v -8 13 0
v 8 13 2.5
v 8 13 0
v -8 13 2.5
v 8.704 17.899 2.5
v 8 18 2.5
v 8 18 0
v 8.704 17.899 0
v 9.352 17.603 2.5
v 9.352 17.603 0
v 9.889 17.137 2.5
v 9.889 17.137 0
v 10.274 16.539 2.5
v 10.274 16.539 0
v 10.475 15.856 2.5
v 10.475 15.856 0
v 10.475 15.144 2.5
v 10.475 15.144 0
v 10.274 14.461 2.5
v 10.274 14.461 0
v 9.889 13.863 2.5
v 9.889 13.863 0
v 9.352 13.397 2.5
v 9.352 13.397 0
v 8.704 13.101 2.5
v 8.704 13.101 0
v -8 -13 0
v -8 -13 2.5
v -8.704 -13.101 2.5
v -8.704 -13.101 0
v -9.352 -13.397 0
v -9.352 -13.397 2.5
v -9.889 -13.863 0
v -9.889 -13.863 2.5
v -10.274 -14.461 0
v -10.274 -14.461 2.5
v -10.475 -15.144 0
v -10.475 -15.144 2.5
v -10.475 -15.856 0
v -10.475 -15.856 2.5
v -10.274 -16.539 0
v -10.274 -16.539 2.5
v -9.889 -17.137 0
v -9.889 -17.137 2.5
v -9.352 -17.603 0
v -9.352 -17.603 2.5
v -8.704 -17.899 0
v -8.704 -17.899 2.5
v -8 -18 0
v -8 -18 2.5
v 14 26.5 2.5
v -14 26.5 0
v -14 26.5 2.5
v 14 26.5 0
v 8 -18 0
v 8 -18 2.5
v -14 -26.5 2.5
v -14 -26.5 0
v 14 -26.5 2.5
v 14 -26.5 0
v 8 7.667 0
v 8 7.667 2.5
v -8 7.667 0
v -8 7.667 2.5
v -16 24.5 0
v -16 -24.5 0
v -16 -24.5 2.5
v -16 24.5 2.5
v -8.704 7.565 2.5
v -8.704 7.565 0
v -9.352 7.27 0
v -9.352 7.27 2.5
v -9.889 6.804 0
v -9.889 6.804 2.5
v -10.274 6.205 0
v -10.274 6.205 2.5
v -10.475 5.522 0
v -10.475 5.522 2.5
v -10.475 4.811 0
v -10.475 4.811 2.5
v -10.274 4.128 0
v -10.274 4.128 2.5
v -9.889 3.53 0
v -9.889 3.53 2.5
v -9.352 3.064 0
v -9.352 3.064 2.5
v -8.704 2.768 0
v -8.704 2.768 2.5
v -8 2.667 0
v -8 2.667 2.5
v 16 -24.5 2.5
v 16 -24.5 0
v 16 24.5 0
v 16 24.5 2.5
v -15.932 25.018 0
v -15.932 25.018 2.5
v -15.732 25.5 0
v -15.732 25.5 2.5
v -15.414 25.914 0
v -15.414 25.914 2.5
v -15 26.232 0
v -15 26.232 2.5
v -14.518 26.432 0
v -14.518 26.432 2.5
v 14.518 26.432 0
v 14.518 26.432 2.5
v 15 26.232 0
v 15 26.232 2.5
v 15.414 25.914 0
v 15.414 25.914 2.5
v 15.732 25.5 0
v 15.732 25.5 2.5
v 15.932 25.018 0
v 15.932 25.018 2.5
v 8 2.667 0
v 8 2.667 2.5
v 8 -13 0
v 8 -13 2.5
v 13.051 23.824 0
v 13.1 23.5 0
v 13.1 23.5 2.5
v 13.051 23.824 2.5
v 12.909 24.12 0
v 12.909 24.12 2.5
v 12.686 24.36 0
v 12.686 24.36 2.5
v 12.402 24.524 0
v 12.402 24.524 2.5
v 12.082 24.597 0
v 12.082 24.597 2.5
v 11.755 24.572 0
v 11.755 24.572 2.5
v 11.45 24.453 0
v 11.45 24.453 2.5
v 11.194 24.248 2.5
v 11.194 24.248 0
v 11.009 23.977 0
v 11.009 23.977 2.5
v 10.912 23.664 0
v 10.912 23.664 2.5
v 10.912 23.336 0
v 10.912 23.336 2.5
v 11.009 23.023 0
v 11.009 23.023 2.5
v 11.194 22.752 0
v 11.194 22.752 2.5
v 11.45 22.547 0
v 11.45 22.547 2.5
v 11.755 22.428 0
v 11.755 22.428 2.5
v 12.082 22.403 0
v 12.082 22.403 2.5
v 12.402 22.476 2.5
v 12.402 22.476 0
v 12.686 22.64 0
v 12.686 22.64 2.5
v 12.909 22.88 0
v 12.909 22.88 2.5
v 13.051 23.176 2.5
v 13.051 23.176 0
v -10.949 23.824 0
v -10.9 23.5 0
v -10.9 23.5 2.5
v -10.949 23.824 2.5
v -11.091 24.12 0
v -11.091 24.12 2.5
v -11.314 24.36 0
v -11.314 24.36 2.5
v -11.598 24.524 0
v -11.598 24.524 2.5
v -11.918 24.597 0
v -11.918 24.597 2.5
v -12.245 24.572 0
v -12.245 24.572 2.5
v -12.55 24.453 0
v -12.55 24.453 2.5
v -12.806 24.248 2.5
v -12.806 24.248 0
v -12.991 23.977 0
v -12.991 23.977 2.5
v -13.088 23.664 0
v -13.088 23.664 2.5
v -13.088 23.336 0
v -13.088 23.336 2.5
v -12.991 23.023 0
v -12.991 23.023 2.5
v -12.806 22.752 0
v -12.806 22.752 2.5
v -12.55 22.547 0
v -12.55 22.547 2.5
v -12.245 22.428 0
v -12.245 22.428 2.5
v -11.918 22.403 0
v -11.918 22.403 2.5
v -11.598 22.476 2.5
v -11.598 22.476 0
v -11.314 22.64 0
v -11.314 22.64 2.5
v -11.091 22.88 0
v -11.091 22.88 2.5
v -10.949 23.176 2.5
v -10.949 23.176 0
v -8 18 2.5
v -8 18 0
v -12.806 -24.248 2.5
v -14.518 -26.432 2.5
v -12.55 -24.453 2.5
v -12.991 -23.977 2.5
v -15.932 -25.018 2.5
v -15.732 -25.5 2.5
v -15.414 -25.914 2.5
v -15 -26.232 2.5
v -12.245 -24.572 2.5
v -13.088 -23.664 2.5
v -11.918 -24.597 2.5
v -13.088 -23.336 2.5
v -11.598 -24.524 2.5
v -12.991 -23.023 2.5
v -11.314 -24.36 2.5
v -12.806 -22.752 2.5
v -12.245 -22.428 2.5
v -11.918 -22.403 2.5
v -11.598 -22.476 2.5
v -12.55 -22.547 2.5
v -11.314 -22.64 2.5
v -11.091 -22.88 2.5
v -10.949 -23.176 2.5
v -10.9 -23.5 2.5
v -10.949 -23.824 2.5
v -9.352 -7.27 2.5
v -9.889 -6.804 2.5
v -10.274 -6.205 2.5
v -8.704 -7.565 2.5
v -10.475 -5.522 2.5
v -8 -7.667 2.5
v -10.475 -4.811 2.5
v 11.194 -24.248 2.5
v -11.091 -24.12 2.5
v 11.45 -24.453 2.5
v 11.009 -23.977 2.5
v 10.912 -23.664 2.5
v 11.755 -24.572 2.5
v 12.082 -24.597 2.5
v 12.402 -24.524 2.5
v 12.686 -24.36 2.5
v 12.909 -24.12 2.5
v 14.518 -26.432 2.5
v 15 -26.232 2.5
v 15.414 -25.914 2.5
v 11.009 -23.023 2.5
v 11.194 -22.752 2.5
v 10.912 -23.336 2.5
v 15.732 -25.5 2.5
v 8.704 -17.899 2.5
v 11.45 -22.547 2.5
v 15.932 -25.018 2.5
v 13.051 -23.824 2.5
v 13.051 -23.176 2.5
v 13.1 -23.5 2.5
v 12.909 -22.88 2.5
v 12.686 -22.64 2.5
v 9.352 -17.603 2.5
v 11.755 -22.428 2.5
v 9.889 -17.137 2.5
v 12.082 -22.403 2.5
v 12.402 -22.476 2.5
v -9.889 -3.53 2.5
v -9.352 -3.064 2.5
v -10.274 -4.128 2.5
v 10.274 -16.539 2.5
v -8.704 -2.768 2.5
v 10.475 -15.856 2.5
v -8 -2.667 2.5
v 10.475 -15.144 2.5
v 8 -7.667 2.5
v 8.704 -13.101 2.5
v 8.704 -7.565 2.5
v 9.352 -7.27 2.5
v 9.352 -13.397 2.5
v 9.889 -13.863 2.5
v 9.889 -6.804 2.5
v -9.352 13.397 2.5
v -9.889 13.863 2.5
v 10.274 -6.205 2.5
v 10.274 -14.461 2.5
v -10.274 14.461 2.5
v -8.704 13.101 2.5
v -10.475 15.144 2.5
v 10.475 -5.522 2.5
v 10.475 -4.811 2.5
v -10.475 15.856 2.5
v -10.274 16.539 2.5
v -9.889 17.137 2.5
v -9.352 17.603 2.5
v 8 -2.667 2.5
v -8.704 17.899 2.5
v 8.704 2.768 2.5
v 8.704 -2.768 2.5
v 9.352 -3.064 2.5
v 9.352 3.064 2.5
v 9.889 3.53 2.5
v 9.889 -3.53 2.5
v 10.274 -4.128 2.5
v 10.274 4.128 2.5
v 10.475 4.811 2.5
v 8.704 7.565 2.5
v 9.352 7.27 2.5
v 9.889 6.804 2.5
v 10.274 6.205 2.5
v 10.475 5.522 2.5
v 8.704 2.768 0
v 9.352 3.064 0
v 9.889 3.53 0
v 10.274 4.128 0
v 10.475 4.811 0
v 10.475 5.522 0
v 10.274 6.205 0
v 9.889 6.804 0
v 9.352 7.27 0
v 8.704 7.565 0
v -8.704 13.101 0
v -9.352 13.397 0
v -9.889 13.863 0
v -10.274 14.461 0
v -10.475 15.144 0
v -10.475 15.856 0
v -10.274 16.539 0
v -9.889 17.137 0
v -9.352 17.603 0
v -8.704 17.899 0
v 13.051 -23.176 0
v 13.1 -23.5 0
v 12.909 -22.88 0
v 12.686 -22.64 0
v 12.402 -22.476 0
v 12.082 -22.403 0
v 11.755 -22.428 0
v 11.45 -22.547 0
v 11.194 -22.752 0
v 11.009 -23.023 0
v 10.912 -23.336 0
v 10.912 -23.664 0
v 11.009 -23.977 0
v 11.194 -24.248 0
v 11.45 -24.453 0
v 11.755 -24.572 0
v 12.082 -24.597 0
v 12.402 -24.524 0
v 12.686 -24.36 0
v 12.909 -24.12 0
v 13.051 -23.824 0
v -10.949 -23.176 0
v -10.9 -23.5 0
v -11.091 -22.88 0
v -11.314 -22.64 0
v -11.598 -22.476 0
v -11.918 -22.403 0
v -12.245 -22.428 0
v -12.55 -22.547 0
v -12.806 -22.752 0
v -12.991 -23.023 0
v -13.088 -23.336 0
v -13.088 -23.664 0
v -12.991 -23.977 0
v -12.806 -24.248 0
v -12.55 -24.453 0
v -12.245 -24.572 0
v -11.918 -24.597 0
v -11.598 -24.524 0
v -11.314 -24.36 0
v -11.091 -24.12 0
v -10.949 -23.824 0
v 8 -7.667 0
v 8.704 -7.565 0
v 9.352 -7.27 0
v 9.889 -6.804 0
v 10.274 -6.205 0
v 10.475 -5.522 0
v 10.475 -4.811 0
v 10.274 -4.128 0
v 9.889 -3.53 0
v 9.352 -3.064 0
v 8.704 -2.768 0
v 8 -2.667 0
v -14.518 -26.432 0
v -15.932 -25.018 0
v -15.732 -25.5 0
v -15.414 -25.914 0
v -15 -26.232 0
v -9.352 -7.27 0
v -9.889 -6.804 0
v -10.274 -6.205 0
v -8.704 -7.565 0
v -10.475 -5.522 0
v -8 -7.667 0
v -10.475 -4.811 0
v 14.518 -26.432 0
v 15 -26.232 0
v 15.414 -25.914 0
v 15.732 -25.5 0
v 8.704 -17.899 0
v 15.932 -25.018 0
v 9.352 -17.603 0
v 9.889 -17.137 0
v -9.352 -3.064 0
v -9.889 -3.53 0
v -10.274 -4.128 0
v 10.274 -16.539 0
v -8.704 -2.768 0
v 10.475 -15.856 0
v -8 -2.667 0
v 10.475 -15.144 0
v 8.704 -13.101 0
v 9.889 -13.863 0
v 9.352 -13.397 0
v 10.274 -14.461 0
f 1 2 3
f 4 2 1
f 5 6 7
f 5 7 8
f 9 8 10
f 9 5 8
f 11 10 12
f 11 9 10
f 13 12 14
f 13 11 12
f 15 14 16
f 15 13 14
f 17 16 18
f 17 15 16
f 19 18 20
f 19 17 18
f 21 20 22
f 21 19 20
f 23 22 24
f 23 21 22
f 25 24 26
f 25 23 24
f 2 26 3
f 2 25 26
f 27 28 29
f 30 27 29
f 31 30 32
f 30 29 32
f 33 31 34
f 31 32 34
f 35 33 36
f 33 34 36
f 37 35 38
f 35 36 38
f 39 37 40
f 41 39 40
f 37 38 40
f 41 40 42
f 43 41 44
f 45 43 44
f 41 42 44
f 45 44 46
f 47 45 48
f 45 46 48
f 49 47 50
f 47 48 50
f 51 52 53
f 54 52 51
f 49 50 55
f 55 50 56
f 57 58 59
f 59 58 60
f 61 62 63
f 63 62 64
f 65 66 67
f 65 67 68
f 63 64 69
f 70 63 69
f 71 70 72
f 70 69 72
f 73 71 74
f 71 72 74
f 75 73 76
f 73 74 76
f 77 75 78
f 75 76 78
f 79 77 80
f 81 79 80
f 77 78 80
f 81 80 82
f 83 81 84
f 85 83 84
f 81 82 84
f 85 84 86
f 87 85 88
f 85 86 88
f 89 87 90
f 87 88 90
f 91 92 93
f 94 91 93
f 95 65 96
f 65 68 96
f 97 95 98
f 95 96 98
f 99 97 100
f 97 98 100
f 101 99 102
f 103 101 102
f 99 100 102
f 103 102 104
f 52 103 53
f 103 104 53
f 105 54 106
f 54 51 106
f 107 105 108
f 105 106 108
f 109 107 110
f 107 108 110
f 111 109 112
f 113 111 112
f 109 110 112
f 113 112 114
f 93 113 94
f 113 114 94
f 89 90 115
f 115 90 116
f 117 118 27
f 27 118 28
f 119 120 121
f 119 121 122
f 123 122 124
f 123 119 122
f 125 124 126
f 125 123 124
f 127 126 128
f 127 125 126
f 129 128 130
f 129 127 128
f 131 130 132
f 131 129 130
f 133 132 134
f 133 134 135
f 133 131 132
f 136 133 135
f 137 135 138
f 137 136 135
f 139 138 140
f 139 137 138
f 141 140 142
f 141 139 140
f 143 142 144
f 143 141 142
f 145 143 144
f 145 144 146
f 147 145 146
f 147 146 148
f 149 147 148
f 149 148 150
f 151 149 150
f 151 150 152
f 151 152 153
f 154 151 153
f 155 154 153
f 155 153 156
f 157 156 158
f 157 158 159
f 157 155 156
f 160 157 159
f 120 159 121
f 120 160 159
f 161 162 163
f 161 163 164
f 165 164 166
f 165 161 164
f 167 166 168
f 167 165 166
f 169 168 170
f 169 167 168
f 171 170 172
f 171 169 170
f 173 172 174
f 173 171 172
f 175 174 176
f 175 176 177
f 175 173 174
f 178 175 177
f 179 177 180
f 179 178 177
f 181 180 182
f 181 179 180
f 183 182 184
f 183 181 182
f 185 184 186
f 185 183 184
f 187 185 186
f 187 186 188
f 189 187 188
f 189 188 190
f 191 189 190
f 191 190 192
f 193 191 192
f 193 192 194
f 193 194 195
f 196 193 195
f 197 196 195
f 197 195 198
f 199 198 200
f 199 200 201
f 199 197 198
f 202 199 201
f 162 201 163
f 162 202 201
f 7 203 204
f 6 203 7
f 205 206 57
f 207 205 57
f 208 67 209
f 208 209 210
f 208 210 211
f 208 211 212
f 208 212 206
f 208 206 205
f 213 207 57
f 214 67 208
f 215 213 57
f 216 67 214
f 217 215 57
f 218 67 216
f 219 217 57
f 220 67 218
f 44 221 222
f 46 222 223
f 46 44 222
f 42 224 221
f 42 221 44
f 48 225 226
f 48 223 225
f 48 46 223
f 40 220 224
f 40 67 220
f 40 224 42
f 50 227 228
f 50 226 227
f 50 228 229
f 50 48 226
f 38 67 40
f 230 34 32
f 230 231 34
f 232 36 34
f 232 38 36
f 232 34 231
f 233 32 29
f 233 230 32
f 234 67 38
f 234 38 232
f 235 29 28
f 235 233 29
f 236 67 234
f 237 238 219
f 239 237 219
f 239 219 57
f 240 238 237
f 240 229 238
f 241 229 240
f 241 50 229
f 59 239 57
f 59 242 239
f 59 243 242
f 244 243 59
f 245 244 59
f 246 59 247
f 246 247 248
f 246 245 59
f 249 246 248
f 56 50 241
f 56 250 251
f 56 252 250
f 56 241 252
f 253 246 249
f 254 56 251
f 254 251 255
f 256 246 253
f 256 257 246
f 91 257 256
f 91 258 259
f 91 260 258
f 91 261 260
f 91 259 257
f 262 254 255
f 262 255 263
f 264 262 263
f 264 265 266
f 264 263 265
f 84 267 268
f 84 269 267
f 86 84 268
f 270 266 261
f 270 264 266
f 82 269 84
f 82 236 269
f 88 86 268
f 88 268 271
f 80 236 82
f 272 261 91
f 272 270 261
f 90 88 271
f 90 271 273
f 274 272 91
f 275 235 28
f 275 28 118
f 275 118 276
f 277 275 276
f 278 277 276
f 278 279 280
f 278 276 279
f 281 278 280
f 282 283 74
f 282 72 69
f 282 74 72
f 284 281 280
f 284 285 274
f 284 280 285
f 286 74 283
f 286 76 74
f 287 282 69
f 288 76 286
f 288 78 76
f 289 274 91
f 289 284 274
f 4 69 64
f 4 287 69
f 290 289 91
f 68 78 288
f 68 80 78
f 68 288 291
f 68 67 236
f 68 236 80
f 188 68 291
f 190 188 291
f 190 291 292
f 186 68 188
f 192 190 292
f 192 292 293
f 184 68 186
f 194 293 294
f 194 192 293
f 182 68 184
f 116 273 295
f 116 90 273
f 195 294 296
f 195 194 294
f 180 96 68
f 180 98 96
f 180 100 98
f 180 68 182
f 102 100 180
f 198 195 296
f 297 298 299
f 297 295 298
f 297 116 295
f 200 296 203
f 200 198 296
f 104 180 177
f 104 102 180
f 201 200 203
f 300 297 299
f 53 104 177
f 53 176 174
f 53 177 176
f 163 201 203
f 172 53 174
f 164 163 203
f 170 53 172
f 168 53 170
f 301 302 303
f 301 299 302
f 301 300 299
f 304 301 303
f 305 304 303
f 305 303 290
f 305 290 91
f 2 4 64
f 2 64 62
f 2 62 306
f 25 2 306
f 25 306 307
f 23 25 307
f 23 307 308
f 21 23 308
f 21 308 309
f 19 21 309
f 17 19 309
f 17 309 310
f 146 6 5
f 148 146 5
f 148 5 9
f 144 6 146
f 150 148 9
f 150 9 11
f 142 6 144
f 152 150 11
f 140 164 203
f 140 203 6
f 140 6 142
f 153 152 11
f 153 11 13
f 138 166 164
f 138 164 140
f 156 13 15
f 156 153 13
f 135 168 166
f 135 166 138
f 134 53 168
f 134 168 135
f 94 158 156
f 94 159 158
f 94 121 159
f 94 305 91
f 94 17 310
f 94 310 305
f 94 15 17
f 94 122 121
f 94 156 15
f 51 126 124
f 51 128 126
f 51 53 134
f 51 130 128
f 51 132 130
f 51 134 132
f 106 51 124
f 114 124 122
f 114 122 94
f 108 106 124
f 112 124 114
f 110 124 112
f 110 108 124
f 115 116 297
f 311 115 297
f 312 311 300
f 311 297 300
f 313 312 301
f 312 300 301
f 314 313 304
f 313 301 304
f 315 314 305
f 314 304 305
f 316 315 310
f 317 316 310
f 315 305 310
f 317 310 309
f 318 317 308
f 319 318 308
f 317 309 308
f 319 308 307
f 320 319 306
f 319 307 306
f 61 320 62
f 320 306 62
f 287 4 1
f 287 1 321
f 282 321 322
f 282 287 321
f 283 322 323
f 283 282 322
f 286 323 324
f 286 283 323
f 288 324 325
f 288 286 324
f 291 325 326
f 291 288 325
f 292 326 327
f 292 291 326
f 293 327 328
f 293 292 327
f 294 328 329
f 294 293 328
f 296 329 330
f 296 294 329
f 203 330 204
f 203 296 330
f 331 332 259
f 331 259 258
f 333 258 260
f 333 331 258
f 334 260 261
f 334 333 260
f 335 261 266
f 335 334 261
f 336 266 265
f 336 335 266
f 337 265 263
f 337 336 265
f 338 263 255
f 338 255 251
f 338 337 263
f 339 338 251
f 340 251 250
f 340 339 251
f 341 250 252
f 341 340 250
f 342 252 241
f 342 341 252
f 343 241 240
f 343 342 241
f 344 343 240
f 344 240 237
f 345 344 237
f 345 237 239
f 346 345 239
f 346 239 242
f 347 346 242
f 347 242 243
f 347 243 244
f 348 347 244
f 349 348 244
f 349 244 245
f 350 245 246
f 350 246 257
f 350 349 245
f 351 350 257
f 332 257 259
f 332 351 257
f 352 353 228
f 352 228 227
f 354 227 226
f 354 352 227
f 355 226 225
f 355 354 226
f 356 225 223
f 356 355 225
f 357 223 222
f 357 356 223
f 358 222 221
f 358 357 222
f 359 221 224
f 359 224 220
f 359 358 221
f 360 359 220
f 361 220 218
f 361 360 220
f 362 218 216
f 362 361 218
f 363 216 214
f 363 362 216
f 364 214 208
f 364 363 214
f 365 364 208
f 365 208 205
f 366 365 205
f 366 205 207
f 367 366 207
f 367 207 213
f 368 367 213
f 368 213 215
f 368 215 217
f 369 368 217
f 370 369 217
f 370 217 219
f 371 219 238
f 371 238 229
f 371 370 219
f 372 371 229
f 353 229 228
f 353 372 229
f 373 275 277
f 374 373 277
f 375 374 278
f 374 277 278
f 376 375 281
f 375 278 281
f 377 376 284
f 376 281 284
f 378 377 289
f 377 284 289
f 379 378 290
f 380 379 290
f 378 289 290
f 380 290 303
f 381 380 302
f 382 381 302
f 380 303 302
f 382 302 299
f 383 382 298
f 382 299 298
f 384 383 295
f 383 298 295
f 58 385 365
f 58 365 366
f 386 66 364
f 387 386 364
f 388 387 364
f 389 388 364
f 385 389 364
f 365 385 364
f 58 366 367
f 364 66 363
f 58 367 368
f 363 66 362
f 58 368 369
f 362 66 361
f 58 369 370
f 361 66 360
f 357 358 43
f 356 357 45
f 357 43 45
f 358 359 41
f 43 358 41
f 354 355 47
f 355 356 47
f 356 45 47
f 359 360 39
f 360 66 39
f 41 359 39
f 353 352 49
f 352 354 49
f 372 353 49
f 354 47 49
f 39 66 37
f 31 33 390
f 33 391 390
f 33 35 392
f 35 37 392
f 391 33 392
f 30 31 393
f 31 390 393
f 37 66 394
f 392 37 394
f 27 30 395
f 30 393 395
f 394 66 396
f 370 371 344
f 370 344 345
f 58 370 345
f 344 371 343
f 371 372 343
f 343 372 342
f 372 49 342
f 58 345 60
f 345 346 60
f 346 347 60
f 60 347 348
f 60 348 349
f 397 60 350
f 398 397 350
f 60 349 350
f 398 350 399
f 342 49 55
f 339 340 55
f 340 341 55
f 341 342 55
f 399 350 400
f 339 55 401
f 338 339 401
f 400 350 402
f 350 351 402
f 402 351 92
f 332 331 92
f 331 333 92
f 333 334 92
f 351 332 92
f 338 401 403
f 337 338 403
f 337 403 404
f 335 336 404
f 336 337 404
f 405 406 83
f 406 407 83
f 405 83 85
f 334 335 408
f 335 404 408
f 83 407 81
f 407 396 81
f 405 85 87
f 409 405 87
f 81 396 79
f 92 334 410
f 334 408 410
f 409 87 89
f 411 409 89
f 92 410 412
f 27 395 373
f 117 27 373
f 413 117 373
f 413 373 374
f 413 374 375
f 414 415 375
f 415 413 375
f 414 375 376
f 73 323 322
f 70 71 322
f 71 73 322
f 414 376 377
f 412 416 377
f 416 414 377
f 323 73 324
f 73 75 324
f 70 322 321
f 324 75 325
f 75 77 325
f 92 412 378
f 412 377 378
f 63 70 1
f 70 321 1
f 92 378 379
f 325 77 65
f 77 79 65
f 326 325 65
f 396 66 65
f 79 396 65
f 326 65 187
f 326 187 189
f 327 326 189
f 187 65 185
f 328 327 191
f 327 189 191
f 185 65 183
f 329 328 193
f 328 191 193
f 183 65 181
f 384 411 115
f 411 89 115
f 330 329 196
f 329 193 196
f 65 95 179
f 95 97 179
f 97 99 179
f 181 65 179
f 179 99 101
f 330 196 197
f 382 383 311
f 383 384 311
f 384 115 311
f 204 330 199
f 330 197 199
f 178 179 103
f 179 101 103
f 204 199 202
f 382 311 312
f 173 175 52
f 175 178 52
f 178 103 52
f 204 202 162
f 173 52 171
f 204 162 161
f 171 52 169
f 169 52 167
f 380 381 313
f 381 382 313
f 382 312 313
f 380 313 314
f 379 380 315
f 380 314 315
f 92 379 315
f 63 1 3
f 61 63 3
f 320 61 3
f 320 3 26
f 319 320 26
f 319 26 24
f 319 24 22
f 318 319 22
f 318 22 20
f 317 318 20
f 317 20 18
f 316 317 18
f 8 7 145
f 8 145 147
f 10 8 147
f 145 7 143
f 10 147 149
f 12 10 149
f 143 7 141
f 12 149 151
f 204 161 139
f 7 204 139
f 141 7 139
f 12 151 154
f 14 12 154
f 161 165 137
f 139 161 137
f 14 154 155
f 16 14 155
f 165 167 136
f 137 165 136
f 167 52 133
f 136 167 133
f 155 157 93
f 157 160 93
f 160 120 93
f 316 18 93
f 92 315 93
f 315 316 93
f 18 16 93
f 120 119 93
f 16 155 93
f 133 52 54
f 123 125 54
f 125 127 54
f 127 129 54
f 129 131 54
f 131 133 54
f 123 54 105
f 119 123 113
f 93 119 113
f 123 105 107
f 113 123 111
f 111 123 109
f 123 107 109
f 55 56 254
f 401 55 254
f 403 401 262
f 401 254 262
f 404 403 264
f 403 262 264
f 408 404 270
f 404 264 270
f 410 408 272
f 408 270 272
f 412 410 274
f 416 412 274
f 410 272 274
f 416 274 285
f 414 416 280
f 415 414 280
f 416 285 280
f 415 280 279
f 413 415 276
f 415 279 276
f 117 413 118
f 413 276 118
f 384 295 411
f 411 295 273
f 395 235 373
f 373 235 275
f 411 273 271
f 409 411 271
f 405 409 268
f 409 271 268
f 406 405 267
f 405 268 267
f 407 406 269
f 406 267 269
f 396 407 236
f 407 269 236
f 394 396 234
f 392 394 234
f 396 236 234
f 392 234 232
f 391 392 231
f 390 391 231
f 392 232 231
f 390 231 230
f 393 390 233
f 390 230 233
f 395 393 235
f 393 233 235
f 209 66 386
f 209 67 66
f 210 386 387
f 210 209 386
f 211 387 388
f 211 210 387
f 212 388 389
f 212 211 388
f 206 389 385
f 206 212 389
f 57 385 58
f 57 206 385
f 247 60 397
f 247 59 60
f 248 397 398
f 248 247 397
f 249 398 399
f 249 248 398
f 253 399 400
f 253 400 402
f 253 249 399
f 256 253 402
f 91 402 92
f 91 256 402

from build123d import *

# Parameters (mm, degrees)
SKETCH1_W           = 32
SKETCH1_H           = 53
SKETCH1_R           = 1.1
BOSS_EXTRUDE1_DEPTH = 2.5
CUT_EXTRUDE2_DEPTH  = 32.056400307
FILLET1_R           = 2


with BuildPart() as part:
    # Sketch1 → Boss-Extrude1 (new body)
    with BuildSketch(Plane.XY):
        Rectangle(SKETCH1_W, SKETCH1_H)
        with Locations((-12, 23.5)):
            Circle(SKETCH1_R, mode=Mode.SUBTRACT)
        with Locations((12, -23.5)):
            Circle(SKETCH1_R, mode=Mode.SUBTRACT)
        with Locations((12, 23.5)):
            Circle(SKETCH1_R, mode=Mode.SUBTRACT)
        with Locations((-12, -23.5)):
            Circle(SKETCH1_R, mode=Mode.SUBTRACT)
    extrude(amount=BOSS_EXTRUDE1_DEPTH)

    # Sketch4 → Cut-Extrude2 (cut, through all)
    with BuildSketch(Plane.XY.offset(2.5)):
        with BuildLine():
            Line((-8, 18), (8, 18))
            ThreePointArc((8, 18), (10.5, 15.5), (8, 13))
            Line((8, 13), (-8, 13))
            ThreePointArc((-8, 13), (-10.5, 15.5), (-8, 18))
        make_face()
        with BuildLine():
            Line((-8, 2.666666667), (8, 2.666666667))
            ThreePointArc((8, 2.666666667), (10.5, 5.166666667), (8, 7.666666667))
            Line((8, 7.666666667), (-8, 7.666666667))
            ThreePointArc((-8, 7.666666667), (-10.5, 5.166666667), (-8, 2.666666667))
        make_face()
        with BuildLine():
            Line((-8, -7.666666667), (8, -7.666666667))
            ThreePointArc((8, -7.666666667), (10.5, -5.166666667), (8, -2.666666667))
            Line((8, -2.666666667), (-8, -2.666666667))
            ThreePointArc((-8, -2.666666667), (-10.5, -5.166666667), (-8, -7.666666667))
        make_face()
        with BuildLine():
            Line((-8, -18), (8, -18))
            ThreePointArc((8, -18), (10.5, -15.5), (8, -13))
            Line((8, -13), (-8, -13))
            ThreePointArc((-8, -13), (-10.5, -15.5), (-8, -18))
        make_face()
    extrude(amount=-CUT_EXTRUDE2_DEPTH, mode=Mode.SUBTRACT)

    # Fillet1
    fillet1_edges = [part.edges().sort_by_distance(p)[0] for p in [
        (16, -26.5, 1.25),
        (-16, -26.5, 1.25),
        (-16, 26.5, 1.25),
        (16, 26.5, 1.25),
    ]]
    fillet(fillet1_edges, radius=FILLET1_R)


solid = part.part
